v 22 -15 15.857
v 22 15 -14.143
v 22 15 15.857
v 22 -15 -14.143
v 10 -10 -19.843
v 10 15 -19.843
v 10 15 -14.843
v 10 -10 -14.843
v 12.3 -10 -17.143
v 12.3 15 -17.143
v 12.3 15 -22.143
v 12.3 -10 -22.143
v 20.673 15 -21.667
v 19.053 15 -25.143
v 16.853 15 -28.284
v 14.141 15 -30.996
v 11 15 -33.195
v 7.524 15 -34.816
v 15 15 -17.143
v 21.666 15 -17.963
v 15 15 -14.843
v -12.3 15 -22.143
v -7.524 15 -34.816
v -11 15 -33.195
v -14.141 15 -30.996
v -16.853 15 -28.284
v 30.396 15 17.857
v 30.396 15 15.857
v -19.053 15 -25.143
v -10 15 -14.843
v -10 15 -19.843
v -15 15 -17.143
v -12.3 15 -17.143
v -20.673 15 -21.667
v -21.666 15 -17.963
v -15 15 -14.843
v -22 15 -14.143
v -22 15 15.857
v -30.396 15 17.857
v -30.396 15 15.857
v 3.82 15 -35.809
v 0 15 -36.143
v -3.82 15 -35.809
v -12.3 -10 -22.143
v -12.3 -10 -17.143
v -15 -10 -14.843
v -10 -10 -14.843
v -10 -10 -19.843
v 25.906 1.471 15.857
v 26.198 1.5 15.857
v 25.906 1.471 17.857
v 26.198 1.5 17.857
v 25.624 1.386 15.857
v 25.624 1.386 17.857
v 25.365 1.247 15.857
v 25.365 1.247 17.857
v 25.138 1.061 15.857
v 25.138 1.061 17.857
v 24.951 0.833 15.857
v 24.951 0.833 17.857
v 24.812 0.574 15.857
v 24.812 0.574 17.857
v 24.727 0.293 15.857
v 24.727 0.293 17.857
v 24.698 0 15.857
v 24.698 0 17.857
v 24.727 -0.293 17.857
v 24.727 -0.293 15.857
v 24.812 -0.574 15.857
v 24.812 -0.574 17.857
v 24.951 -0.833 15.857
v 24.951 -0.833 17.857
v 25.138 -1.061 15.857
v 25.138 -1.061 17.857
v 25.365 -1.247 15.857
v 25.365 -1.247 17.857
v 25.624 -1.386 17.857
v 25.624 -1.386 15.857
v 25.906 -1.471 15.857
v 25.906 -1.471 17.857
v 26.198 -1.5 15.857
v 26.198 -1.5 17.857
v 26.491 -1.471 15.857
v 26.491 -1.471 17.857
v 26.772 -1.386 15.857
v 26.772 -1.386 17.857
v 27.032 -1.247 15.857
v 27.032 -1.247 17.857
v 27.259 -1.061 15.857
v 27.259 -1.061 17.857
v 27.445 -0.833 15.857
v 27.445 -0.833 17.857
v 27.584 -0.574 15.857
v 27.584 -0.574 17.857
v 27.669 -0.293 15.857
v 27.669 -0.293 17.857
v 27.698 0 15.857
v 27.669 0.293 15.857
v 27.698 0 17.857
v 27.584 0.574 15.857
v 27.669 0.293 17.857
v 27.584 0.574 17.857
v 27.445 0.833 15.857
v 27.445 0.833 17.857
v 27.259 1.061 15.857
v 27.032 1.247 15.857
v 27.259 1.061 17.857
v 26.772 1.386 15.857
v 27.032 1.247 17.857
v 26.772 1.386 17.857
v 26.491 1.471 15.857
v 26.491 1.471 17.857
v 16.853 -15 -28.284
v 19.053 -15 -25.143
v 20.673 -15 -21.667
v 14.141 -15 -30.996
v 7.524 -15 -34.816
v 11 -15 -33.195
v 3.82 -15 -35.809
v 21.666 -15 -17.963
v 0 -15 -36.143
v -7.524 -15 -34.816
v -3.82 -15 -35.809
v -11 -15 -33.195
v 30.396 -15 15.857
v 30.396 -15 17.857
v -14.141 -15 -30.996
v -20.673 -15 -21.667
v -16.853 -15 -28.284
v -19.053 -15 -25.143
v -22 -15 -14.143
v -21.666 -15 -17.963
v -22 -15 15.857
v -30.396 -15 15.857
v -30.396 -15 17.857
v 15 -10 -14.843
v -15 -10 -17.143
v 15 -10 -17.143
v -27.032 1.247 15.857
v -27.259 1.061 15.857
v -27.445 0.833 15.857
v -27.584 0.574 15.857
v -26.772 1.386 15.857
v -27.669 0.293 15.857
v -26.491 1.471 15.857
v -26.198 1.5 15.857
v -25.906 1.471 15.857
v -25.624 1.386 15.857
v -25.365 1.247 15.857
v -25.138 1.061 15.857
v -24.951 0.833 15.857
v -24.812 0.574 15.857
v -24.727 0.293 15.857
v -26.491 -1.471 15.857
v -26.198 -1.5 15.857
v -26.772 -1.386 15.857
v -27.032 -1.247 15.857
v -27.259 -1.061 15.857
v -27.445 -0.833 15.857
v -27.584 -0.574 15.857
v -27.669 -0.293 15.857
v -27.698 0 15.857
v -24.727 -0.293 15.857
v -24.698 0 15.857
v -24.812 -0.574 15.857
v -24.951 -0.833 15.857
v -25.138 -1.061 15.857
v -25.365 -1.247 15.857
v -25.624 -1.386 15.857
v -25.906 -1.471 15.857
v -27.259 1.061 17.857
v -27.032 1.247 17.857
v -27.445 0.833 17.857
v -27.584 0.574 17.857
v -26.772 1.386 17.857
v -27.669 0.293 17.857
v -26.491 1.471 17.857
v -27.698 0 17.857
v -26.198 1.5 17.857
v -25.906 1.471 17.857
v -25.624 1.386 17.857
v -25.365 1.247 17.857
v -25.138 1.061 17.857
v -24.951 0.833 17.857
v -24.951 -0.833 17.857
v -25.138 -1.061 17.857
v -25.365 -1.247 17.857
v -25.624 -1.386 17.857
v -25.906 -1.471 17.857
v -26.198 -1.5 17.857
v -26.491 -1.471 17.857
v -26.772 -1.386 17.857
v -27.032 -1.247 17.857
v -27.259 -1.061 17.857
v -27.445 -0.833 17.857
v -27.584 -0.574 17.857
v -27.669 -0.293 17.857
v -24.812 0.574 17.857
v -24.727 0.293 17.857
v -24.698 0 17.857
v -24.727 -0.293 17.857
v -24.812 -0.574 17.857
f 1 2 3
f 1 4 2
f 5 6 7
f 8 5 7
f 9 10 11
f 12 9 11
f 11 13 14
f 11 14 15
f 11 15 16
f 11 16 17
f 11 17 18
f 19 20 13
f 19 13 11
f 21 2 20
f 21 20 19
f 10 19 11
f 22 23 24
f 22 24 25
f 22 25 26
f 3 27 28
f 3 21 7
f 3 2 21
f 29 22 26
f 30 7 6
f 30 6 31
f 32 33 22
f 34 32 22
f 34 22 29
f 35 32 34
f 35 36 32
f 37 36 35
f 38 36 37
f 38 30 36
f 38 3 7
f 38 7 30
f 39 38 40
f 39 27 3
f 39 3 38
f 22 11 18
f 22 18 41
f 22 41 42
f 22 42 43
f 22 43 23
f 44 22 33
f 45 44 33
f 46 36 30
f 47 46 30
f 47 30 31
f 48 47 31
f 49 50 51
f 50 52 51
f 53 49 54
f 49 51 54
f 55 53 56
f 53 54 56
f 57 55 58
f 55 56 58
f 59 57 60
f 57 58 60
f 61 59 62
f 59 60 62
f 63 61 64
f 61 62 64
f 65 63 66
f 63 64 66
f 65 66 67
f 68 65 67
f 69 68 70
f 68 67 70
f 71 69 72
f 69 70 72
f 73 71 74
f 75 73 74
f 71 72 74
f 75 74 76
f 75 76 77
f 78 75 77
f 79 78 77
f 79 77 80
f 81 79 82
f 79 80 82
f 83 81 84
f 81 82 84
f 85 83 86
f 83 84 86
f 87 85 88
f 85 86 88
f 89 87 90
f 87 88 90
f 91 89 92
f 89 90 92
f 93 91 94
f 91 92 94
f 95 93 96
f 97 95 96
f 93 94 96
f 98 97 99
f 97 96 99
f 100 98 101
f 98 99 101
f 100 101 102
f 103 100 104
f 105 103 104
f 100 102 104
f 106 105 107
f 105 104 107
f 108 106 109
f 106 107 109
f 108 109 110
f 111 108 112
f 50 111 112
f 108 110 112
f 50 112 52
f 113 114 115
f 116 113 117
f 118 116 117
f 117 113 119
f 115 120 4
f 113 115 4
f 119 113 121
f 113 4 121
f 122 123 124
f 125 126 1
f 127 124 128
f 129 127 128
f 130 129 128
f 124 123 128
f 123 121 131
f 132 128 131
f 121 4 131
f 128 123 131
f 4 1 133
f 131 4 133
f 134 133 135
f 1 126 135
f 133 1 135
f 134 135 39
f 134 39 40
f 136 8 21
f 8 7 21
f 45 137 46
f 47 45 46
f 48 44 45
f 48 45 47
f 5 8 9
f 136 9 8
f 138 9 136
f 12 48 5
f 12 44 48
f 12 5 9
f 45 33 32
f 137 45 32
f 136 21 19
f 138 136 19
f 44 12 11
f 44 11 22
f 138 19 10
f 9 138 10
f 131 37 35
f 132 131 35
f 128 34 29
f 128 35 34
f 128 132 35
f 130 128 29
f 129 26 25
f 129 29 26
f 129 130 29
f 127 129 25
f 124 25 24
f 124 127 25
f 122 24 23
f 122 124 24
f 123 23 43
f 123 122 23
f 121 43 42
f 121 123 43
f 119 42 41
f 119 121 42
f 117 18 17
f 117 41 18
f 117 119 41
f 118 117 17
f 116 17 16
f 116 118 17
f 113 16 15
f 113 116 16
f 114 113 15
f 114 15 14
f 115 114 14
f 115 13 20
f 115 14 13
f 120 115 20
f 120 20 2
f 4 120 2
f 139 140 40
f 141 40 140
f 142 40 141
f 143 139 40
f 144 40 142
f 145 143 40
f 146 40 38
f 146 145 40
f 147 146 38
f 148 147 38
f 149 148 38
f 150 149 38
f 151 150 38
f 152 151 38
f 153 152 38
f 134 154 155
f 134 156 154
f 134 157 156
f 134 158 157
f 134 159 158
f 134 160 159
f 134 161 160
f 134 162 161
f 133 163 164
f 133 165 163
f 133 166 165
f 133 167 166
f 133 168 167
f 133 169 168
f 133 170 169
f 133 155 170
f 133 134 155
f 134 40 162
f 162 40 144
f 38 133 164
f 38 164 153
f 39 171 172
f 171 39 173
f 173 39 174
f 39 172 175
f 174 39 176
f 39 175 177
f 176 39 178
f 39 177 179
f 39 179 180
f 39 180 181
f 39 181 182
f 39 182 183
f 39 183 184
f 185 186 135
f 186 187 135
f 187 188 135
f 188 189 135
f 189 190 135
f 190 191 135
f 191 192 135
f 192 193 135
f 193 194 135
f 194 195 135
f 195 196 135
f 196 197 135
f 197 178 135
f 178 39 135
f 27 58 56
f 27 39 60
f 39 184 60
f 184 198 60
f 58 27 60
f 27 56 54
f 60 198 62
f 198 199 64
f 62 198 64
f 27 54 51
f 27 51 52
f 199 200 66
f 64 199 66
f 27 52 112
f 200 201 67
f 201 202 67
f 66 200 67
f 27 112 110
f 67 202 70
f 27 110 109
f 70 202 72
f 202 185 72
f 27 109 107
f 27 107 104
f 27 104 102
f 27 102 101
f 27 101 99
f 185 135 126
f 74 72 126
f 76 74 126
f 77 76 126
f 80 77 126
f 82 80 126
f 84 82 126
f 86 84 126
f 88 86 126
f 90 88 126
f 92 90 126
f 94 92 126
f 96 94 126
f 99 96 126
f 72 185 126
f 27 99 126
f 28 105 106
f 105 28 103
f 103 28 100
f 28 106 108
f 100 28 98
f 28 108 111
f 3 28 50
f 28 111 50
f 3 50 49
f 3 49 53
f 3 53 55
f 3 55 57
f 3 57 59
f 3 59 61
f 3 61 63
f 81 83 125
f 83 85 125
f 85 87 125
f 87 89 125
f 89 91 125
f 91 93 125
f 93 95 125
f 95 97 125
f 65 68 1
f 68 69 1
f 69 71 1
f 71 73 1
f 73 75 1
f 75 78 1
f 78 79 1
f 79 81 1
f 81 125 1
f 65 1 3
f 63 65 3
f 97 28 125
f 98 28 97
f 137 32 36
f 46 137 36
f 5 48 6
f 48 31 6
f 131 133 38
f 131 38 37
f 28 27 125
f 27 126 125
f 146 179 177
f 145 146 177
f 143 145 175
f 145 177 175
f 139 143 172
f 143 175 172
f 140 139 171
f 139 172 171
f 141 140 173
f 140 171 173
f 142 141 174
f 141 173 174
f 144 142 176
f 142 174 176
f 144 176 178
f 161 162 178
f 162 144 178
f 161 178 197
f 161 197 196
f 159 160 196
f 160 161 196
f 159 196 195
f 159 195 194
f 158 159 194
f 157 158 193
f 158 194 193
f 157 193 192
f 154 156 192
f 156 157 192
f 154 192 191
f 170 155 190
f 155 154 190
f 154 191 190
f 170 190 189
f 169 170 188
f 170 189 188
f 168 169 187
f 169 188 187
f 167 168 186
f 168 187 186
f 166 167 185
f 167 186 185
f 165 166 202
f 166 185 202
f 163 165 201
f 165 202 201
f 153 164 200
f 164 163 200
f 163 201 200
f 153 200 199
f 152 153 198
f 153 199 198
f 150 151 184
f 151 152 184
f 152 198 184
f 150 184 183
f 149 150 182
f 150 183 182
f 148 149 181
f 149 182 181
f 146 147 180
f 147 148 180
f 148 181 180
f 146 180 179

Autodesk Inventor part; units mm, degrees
ref_plane "YZ Plane" through (0, 0, 0) normal (1, 0, 0) x (0, 1, 0)
ref_plane "XZ Plane" through (0, 0, 0) normal (0, 1, 0) x (-1, 0, 0)
ref_plane "XY Plane" through (0, 0, 0) normal (0, 0, 1) x (1, 0, 0)
sketch "Sketch1" plane through (0, 0, 0) normal (0, 1, 0) x (-1, 0, 0)
  line L0 (-22, -14.1429) -> (-22, 15.8571)
  line L1 (-20.3963, 17.8571) -> (20.3963, 17.8571)
  line L2 (22, 15.8571) -> (22, -14.1429)
  arc A0 (-22, -14.1429) -> (22, -14.1429) centre (0, -14.1429) ccw
  line L3 (20.3963, 17.8571) -> (30.3963, 17.8571)
  line L4 (30.3963, 17.8571) -> (30.3963, 15.8571)
  line L5 (30.3963, 15.8571) -> (22, 15.8571)
  line L6 (-20.3963, 17.8571) -> (-30.3963, 17.8571)
  line L7 (-30.3963, 17.8571) -> (-30.3963, 15.8571)
  line L8 (-30.3963, 15.8571) -> (-22, 15.8571)
  point P0 (0, 0)
  point P1 (0, 17.8571)
  point P2 (22, 0)
  dimension "d1" = 2
  dimension "d2" = 2
  dimension "d3" = 10
  dimension "d4" = 10
  dimension "d5" = 30
  dimension "d6" = 22
extrude "Extrusion1" add sketch "Sketch1" along normal mid plane 30
sketch "Sketch2" plane through (0, 15, 0) normal (0, 1, 0) x (1, 0, 0)
  line L0 (-15, 14.8429) -> (-10, 14.8429)
  line L1 (-10, 14.8429) -> (-10, 19.8429)
  line L2 (-10, 19.8429) -> (10, 19.8429)
  line L3 (10, 19.8429) -> (10, 14.8429)
  line L4 (10, 14.8429) -> (15, 14.8429)
  line L5 (15, 14.8429) -> (15, 17.1429)
  line L6 (15, 17.1429) -> (12.3, 17.1429)
  line L7 (12.3, 17.1429) -> (12.3, 22.1429)
  line L8 (12.3, 22.1429) -> (-12.3, 22.1429)
  line L9 (-12.3, 22.1429) -> (-12.3, 17.1429)
  line L10 (-12.3, 17.1429) -> (-15, 17.1429)
  line L11 (-15, 17.1429) -> (-15, 14.8429)
  arc A0 (22, 14.1429) -> (-22, 14.1429) centre (0, 14.1429) ccw projected
  point P0 (0, 0)
  point P1 (0, 22.1429)
  point P2 (0, 19.8429)
  point P3 (0, 36.1429)
  point P4 (15, 15.9929)
  point P5 (-15, 15.9929)
  point P6 (10, 17.3429)
  point P7 (-10, 17.3429)
  point P8 (-12.5, 14.8429)
  point P9 (-13.65, 17.1429)
  dimension "d9" = 14
  dimension "d11" = 2.3
  dimension "d13" = 24.6
  dimension "d14" = 20
  dimension "d15" = 5
  dimension "d17" = 5
  dimension "d27" = 2.3
extrude "Extrusion2" cut sketch "Sketch2" against normal blind 25
sketch "Sketch3" plane through (30.3963, 15, 15.8571) normal (0, 0, -1) x (-1, 0, 0)
  line L0 (0, -30) -> (0, 0) projected
  line L1 (0, 0) -> (8.3963, 0) projected
  point P0 (30.3963, -15)
  point P1 (4.1982, -15)
  point P2 (0, -15)
  point P3 (4.1982, 0)
hole "Hole1" at (26.1982, 0, 15.8571) direction (0, 0, 1) diameter 3 depth 2
mirror "Mirror1" about plane through (0, 0, 0) normal (1, 0, 0) of "Hole1"
properties part number "Part_B7"
